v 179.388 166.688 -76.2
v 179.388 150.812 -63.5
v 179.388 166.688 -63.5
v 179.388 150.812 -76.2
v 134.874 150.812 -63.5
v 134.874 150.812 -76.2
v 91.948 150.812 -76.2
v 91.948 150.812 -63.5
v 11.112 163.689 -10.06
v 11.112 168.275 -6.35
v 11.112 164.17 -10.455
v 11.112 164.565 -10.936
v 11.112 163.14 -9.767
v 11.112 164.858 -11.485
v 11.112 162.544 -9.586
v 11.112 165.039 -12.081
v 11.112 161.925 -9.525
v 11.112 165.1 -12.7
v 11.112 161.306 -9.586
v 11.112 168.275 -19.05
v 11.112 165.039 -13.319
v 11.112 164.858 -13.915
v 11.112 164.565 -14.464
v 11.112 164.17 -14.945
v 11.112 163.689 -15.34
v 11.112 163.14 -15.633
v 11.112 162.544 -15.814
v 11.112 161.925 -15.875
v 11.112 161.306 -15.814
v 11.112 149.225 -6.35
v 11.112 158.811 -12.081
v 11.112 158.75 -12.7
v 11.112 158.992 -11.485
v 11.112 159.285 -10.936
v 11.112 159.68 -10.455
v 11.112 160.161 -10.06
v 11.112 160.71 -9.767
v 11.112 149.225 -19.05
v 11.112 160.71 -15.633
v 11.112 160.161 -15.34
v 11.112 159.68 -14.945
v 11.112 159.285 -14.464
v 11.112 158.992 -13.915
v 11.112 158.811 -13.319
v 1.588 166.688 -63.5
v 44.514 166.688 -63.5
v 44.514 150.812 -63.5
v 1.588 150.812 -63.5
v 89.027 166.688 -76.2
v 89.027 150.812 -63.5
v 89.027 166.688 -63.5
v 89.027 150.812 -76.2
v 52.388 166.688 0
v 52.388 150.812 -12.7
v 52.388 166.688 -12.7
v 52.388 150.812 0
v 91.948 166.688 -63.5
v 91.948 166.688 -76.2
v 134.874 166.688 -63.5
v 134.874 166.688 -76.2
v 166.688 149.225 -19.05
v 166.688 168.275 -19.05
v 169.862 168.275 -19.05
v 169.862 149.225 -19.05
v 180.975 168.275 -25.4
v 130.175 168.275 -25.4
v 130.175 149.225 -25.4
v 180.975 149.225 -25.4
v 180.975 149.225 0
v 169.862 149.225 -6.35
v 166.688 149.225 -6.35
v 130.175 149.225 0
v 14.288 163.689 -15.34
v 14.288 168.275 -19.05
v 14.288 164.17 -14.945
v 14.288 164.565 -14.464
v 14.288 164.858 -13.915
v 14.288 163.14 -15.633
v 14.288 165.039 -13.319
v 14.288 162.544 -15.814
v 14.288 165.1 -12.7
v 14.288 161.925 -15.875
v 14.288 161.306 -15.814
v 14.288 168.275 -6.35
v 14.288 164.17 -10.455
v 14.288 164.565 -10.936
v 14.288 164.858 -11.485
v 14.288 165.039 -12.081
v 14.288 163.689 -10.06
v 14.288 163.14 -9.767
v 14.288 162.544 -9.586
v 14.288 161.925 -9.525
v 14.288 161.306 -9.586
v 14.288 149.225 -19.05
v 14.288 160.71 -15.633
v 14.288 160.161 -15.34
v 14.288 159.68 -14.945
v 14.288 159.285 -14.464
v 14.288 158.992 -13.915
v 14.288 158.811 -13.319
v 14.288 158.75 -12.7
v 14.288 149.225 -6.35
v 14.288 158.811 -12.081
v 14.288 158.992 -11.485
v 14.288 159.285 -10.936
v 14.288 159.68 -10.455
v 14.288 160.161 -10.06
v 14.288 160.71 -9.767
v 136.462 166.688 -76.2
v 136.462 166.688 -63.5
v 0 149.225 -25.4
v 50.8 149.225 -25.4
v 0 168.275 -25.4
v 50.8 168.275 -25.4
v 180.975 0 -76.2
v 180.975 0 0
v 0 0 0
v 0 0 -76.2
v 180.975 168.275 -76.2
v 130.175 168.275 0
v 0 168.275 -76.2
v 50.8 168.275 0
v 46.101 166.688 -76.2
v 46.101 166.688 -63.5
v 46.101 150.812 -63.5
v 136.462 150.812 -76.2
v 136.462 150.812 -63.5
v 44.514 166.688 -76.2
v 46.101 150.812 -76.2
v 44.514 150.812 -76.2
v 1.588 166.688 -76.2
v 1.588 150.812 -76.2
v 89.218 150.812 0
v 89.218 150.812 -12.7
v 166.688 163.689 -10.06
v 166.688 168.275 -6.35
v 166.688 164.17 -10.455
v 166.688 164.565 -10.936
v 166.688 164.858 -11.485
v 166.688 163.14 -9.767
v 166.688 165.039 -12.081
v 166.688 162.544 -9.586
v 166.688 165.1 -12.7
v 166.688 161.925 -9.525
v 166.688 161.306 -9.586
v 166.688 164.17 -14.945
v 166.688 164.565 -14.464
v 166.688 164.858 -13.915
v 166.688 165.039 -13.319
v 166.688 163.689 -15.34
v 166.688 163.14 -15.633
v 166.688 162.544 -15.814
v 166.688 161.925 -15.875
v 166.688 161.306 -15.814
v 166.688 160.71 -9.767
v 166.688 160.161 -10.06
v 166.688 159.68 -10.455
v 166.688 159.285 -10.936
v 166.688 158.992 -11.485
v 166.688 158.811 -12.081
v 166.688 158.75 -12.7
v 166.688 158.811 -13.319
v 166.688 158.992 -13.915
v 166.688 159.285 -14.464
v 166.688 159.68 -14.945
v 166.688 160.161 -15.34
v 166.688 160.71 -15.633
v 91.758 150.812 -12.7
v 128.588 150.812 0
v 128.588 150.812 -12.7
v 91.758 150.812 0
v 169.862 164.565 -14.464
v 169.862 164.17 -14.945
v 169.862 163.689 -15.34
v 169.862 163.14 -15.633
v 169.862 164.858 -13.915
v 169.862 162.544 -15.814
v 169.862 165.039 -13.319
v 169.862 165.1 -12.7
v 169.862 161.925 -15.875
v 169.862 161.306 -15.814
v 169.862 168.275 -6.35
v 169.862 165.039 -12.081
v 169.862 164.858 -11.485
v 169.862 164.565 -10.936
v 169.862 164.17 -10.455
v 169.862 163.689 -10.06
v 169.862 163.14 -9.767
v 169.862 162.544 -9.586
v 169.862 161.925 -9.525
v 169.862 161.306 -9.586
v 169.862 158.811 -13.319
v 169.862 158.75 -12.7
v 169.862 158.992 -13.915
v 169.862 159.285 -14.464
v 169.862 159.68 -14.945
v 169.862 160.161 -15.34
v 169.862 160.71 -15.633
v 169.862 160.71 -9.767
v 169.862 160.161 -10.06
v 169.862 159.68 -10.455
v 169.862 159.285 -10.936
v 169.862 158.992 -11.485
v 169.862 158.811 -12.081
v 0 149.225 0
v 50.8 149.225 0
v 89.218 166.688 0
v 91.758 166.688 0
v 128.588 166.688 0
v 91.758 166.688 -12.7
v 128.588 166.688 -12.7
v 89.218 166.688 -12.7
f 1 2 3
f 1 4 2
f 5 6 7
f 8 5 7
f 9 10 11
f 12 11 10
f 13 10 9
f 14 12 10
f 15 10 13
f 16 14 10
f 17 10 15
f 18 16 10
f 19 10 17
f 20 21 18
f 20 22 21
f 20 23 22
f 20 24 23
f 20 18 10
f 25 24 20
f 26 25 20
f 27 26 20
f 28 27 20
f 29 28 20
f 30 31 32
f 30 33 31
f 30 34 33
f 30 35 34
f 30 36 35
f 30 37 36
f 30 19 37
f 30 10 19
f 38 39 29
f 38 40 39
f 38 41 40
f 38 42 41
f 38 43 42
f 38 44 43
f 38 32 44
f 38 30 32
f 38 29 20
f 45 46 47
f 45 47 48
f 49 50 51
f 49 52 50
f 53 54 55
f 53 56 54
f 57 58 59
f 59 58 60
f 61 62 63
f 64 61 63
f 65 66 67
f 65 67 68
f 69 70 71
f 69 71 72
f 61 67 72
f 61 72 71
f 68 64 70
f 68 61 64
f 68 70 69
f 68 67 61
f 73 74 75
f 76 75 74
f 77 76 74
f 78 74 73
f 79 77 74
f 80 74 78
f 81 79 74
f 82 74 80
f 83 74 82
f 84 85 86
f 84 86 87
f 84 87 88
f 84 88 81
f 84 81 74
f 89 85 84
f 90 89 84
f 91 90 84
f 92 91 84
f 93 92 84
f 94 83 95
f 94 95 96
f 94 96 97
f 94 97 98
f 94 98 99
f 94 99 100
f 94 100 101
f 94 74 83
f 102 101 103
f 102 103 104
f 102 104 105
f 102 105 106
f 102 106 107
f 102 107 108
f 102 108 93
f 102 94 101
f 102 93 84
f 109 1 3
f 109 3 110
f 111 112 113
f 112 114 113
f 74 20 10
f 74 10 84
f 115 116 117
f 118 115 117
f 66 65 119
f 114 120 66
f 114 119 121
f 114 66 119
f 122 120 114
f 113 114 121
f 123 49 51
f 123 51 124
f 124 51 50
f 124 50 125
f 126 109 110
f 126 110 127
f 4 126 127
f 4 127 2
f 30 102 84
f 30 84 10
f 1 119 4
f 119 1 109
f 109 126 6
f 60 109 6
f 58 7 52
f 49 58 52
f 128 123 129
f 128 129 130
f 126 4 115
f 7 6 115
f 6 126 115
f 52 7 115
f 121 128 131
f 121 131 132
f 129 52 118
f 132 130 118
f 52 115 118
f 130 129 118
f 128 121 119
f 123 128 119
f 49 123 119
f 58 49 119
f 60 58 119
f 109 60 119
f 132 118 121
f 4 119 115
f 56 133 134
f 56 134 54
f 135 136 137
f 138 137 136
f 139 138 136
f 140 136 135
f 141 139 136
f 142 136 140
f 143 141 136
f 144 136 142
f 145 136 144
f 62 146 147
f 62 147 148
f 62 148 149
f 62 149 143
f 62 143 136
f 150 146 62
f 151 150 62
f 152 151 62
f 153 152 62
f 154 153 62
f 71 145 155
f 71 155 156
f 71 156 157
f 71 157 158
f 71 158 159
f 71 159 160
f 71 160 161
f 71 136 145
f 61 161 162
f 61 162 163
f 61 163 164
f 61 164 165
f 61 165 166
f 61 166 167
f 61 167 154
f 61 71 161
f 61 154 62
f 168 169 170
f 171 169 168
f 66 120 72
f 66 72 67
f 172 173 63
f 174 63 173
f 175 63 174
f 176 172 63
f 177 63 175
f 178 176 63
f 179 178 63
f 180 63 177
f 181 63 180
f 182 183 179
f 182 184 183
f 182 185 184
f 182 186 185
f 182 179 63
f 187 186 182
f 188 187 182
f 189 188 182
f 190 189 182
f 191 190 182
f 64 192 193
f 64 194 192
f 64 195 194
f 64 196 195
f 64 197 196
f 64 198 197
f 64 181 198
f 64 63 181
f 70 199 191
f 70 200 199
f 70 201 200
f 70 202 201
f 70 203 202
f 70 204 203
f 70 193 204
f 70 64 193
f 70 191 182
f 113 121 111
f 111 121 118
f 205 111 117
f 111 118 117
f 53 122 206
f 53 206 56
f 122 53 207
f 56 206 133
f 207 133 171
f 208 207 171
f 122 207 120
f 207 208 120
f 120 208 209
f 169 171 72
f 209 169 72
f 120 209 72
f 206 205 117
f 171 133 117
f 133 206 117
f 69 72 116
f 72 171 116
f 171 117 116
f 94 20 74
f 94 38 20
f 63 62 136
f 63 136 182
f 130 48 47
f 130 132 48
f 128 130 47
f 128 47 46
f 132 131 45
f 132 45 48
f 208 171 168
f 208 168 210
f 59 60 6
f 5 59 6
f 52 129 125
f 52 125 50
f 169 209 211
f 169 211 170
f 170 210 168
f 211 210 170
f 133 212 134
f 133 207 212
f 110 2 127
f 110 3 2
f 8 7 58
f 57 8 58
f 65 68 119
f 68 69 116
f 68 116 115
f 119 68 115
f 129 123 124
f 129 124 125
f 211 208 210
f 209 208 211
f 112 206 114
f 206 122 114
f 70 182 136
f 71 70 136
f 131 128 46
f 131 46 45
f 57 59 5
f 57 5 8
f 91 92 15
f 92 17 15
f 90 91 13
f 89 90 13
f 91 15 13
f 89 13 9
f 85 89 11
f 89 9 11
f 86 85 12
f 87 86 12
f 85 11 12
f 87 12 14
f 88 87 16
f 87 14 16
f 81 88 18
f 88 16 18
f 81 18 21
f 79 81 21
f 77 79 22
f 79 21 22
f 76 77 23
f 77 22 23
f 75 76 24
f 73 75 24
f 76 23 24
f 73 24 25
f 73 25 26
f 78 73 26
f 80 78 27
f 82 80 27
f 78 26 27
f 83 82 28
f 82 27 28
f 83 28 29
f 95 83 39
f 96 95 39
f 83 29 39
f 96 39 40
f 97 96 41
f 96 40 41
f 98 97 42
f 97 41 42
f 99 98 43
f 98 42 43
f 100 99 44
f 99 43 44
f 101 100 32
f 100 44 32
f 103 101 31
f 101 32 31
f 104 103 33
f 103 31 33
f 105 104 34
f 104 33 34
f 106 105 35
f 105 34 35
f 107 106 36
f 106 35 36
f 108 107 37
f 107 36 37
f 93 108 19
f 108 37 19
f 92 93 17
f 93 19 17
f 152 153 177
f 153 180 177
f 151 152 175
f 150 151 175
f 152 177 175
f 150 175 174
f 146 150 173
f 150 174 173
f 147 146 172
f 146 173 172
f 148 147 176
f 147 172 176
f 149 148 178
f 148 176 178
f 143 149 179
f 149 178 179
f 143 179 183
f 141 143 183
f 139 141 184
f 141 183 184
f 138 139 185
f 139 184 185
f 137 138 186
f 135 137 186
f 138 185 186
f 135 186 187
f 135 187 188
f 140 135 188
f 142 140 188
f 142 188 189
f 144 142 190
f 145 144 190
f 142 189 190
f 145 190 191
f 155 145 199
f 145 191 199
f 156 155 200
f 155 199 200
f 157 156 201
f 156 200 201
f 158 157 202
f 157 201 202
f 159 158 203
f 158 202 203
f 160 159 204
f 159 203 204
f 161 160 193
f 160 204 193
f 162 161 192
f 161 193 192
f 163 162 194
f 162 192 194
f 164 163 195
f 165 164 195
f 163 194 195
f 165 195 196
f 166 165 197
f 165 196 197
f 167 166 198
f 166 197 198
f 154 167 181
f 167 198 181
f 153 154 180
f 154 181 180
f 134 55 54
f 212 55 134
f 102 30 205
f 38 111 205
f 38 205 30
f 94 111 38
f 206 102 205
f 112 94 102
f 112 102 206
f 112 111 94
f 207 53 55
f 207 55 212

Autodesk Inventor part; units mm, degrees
ref_plane "YZ Plane" through (0, 0, 0) normal (1, 0, 0) x (0, 1, 0)
ref_plane "XZ Plane" through (0, 0, 0) normal (0, 1, 0) x (-1, 0, 0)
ref_plane "XY Plane" through (0, 0, 0) normal (0, 0, 1) x (1, 0, 0)
sketch "Sketch1" plane through (0, 0, 0) normal (0, 1, 0) x (-1, 0, 0)
  line L0 (0, 0) -> (-180.975, 0)
  line L1 (-180.975, 0) -> (-180.975, -76.2)
  line L2 (-180.975, -76.2) -> (0, -76.2)
  line L3 (0, -76.2) -> (0, 0)
  dimension "d0" = 180.975
  dimension "d1" = 76.2
extrude "Extrusion1" add sketch "Sketch1" along normal blind 168.275
sketch "Sketch2" plane through (0, 168.275, 0) normal (0, 1, 0) x (1, 0, 0)
  line L0 (0, 0) -> (180.975, 0) projected
  line L1 (180.975, 0) -> (180.975, 76.2) projected
  line L2 (180.975, 76.2) -> (0, 76.2) projected
  line L3 (0, 76.2) -> (0, 0) projected
  line L4 (0, 0) -> (50.8, 0)
  line L5 (50.8, 0) -> (50.8, 25.4)
  line L6 (50.8, 25.4) -> (0, 25.4)
  line L7 (0, 25.4) -> (0, 0)
  line L8 (180.975, 0) -> (130.175, 0)
  line L9 (130.175, 0) -> (130.175, 25.4)
  line L10 (130.175, 25.4) -> (180.975, 25.4)
  line L11 (180.975, 25.4) -> (180.975, 0)
  dimension "d4" = 50.8
  dimension "d5" = 25.4
  dimension "d6" = 50.8
  dimension "d7" = 25.4
extrude "Extrusion2" cut sketch "Sketch2" against normal blind 19.05 contours L3 L6 L5 L0 | L9 L10 L1 L0
sketch "Sketch3" plane through (0, 0, 0) normal (0, 0, 1) x (1, 0, 0)
  line L0 (50.8, 168.275) -> (50.8, 149.225) construction
  line L1 (50.8, 149.225) -> (0, 149.225) projected
  line L2 (0, 0) -> (0, 149.225) projected
  line L3 (0, 0) -> (180.975, 0) projected
  line L4 (180.975, 0) -> (180.975, 149.225) projected
  line L5 (180.975, 149.225) -> (130.175, 149.225) projected
  line L6 (130.175, 149.225) -> (130.175, 168.275) construction
  line L7 (50.8, 168.275) -> (130.175, 168.275) construction
  line L8 (50.8, 168.275) -> (130.175, 168.275)
  line L9 (130.175, 168.275) -> (130.175, 149.225)
  line L10 (130.175, 149.225) -> (50.8, 149.225) construction
  line L11 (50.8, 149.225) -> (50.8, 168.275)
  line L12 (52.3875, 150.8125) -> (128.5875, 150.8125) construction
  line L13 (128.5875, 150.8125) -> (128.5875, 166.6875) construction
  line L14 (128.5875, 166.6875) -> (52.3875, 166.6875) construction
  line L15 (52.3875, 166.6875) -> (52.3875, 150.8125) construction
  line L16 (52.3875, 166.6875) -> (89.2175, 166.6875)
  line L17 (89.2175, 166.6875) -> (89.2175, 150.8125)
  line L18 (89.2175, 150.8125) -> (52.3875, 150.8125)
  line L19 (52.3875, 150.8125) -> (52.3875, 166.6875)
  line L20 (128.5875, 150.8125) -> (91.7575, 150.8125)
  line L21 (91.7575, 150.8125) -> (91.7575, 166.6875)
  line L22 (91.7575, 166.6875) -> (128.5875, 166.6875)
  line L23 (128.5875, 166.6875) -> (128.5875, 150.8125)
  dimension "d10" = 1.5875
  dimension "d11" = 36.83
  dimension "d12" = 36.83
extrude "Extrusion3" cut sketch "Sketch3" against normal blind 12.7 contours L16 L17 L18 L19 | L20 L21 L22 L23
sketch "Sketch4" plane through (180.975, 0, -76.2) normal (0, 0, -1) x (-1, 0, 0)
  line L0 (0, 0) -> (180.975, 0) construction
  line L1 (180.975, 0) -> (180.975, 168.275) construction
  line L2 (0, 168.275) -> (180.975, 168.275) construction
  line L3 (0, 0) -> (0, 168.275) construction
  line L4 (0, 168.275) -> (180.975, 168.275) construction
  line L5 (180.975, 168.275) -> (180.975, 149.225) construction
  line L6 (180.975, 149.225) -> (0, 149.225) construction
  line L7 (0, 149.225) -> (0, 168.275) construction
  line L8 (1.5875, 150.8125) -> (179.3875, 150.8125) construction
  line L9 (179.3875, 150.8125) -> (179.3875, 166.6875) construction
  line L10 (179.3875, 166.6875) -> (1.5875, 166.6875) construction
  line L11 (1.5875, 166.6875) -> (1.5875, 150.8125) construction
  line L12 (1.5875, 166.6875) -> (44.5135, 166.6875)
  line L13 (44.5135, 166.6875) -> (44.5135, 150.8125)
  line L14 (44.5135, 150.8125) -> (1.5875, 150.8125)
  line L15 (1.5875, 150.8125) -> (1.5875, 166.6875)
  line L16 (179.3875, 150.8125) -> (136.4615, 150.8125)
  line L17 (136.4615, 150.8125) -> (136.4615, 166.6875)
  line L18 (136.4615, 166.6875) -> (179.3875, 166.6875)
  line L19 (179.3875, 166.6875) -> (179.3875, 150.8125)
  line L20 (46.101, 150.8125) -> (89.027, 150.8125)
  line L21 (89.027, 150.8125) -> (89.027, 166.6875)
  line L22 (89.027, 166.6875) -> (46.101, 166.6875)
  line L23 (46.101, 166.6875) -> (46.101, 150.8125)
  line L24 (134.874, 150.8125) -> (91.948, 150.8125)
  line L25 (91.948, 150.8125) -> (91.948, 166.6875)
  line L26 (91.948, 166.6875) -> (134.874, 166.6875)
  line L27 (134.874, 166.6875) -> (134.874, 150.8125)
  dimension "d15" = 1.5875
  dimension "d16" = 42.926
  dimension "d17" = 42.926
  dimension "d18" = 42.926
  dimension "d19" = 42.926
  dimension "d20" = 1.5875
  dimension "d21" = 1.5875
extrude "Extrusion4" cut sketch "Sketch4" against normal blind 12.7
sketch "Sketch5" plane through (0, 149.225, 0) normal (0, 1, 0) x (1, 0, 0)
  line L0 (50.8, 0) -> (0, 0) projected
  line L1 (50.8, 25.4) -> (50.8, 0) projected
  line L2 (0, 25.4) -> (50.8, 25.4) projected
  line L3 (0, 0) -> (0, 25.4) projected
  line L4 (180.975, 25.4) -> (180.975, 0) projected
  line L5 (130.175, 25.4) -> (180.975, 25.4) projected
  line L6 (130.175, 0) -> (130.175, 25.4) projected
  line L7 (180.975, 0) -> (130.175, 0) projected
  line L8 (0, 0) -> (12.7, 0) construction
  line L9 (12.7, 0) -> (12.7, 12.7) construction
  line L10 (12.7, 12.7) -> (0, 12.7) construction
  line L11 (0, 12.7) -> (0, 0) construction
  line L12 (180.975, 0) -> (168.275, 0) construction
  line L13 (168.275, 0) -> (168.275, 12.7) construction
  line L14 (168.275, 12.7) -> (180.975, 12.7) construction
  line L15 (180.975, 12.7) -> (180.975, 0) construction
  line L16 (11.1125, 19.05) -> (14.2875, 19.05)
  line L17 (14.2875, 19.05) -> (14.2875, 6.35)
  line L18 (14.2875, 6.35) -> (11.1125, 6.35)
  line L19 (11.1125, 6.35) -> (11.1125, 19.05)
  line L20 (11.1125, 19.05) -> (14.2875, 6.35) construction
  line L21 (14.2875, 19.05) -> (11.1125, 6.35) construction
  line L22 (169.8625, 6.35) -> (166.6875, 6.35)
  line L23 (166.6875, 6.35) -> (166.6875, 19.05)
  line L24 (166.6875, 19.05) -> (169.8625, 19.05)
  line L25 (169.8625, 19.05) -> (169.8625, 6.35)
  line L26 (169.8625, 6.35) -> (166.6875, 19.05) construction
  line L27 (166.6875, 6.35) -> (169.8625, 19.05) construction
  dimension "d24" = 12.7
  dimension "d25" = 12.7
  dimension "d26" = 12.7
  dimension "d27" = 12.7
  dimension "d28" = 3.175
  dimension "d29" = 12.7
  dimension "d30" = 3.175
  dimension "d31" = 12.7
extrude "Extrusion5" add sketch "Sketch5" along normal blind 19.05 contours L16 L17 L18 L19 | L22 L23 L24 L25
sketch "Sketch6" plane through (169.8625, 149.225, -6.35) normal (1, 0, 0) x (0, 0, -1)
  line L0 (12.7, 0) -> (0, 0) construction
  line L1 (12.7, 0) -> (12.7, 19.05) construction
  line L2 (0, 19.05) -> (12.7, 19.05) construction
  line L3 (0, 0) -> (0, 19.05) construction
  line L4 (0, 19.05) -> (6.35, 19.05) construction
  line L5 (6.35, 19.05) -> (6.35, 12.7) construction
  line L6 (6.35, 12.7) -> (0, 12.7) construction
  line L7 (0, 12.7) -> (0, 19.05) construction
  circle A0 centre (6.35, 12.7) radius 3.175
  point P0 (-6.35, -149.225)
  dimension "d34" = 6.35
  dimension "d35" = 6.35
  dimension "d36" = 6.35
extrude "Extrusion6" cut sketch "Sketch6" against normal blind 25.4
sketch "Sketch7" plane through (11.1125, 149.225, -19.05) normal (-1, 0, 0) x (0, 0, 1)
  line L0 (12.7, 0) -> (0, 0) construction
  line L1 (12.7, 0) -> (12.7, 19.05) construction
  line L2 (0, 19.05) -> (12.7, 19.05) construction
  line L3 (0, 0) -> (0, 19.05) construction
  line L4 (12.7, 19.05) -> (6.35, 19.05) construction
  line L5 (6.35, 19.05) -> (6.35, 12.7) construction
  line L6 (6.35, 12.7) -> (12.7, 12.7) construction
  line L7 (12.7, 12.7) -> (12.7, 19.05) construction
  circle A0 centre (6.35, 12.7) radius 3.175
  point P0 (19.05, -149.225)
  dimension "d39" = 6.35
  dimension "d40" = 6.35
  dimension "d41" = 6.35
extrude "Extrusion7" cut sketch "Sketch7" against normal blind 25.4
properties part number "battery"
